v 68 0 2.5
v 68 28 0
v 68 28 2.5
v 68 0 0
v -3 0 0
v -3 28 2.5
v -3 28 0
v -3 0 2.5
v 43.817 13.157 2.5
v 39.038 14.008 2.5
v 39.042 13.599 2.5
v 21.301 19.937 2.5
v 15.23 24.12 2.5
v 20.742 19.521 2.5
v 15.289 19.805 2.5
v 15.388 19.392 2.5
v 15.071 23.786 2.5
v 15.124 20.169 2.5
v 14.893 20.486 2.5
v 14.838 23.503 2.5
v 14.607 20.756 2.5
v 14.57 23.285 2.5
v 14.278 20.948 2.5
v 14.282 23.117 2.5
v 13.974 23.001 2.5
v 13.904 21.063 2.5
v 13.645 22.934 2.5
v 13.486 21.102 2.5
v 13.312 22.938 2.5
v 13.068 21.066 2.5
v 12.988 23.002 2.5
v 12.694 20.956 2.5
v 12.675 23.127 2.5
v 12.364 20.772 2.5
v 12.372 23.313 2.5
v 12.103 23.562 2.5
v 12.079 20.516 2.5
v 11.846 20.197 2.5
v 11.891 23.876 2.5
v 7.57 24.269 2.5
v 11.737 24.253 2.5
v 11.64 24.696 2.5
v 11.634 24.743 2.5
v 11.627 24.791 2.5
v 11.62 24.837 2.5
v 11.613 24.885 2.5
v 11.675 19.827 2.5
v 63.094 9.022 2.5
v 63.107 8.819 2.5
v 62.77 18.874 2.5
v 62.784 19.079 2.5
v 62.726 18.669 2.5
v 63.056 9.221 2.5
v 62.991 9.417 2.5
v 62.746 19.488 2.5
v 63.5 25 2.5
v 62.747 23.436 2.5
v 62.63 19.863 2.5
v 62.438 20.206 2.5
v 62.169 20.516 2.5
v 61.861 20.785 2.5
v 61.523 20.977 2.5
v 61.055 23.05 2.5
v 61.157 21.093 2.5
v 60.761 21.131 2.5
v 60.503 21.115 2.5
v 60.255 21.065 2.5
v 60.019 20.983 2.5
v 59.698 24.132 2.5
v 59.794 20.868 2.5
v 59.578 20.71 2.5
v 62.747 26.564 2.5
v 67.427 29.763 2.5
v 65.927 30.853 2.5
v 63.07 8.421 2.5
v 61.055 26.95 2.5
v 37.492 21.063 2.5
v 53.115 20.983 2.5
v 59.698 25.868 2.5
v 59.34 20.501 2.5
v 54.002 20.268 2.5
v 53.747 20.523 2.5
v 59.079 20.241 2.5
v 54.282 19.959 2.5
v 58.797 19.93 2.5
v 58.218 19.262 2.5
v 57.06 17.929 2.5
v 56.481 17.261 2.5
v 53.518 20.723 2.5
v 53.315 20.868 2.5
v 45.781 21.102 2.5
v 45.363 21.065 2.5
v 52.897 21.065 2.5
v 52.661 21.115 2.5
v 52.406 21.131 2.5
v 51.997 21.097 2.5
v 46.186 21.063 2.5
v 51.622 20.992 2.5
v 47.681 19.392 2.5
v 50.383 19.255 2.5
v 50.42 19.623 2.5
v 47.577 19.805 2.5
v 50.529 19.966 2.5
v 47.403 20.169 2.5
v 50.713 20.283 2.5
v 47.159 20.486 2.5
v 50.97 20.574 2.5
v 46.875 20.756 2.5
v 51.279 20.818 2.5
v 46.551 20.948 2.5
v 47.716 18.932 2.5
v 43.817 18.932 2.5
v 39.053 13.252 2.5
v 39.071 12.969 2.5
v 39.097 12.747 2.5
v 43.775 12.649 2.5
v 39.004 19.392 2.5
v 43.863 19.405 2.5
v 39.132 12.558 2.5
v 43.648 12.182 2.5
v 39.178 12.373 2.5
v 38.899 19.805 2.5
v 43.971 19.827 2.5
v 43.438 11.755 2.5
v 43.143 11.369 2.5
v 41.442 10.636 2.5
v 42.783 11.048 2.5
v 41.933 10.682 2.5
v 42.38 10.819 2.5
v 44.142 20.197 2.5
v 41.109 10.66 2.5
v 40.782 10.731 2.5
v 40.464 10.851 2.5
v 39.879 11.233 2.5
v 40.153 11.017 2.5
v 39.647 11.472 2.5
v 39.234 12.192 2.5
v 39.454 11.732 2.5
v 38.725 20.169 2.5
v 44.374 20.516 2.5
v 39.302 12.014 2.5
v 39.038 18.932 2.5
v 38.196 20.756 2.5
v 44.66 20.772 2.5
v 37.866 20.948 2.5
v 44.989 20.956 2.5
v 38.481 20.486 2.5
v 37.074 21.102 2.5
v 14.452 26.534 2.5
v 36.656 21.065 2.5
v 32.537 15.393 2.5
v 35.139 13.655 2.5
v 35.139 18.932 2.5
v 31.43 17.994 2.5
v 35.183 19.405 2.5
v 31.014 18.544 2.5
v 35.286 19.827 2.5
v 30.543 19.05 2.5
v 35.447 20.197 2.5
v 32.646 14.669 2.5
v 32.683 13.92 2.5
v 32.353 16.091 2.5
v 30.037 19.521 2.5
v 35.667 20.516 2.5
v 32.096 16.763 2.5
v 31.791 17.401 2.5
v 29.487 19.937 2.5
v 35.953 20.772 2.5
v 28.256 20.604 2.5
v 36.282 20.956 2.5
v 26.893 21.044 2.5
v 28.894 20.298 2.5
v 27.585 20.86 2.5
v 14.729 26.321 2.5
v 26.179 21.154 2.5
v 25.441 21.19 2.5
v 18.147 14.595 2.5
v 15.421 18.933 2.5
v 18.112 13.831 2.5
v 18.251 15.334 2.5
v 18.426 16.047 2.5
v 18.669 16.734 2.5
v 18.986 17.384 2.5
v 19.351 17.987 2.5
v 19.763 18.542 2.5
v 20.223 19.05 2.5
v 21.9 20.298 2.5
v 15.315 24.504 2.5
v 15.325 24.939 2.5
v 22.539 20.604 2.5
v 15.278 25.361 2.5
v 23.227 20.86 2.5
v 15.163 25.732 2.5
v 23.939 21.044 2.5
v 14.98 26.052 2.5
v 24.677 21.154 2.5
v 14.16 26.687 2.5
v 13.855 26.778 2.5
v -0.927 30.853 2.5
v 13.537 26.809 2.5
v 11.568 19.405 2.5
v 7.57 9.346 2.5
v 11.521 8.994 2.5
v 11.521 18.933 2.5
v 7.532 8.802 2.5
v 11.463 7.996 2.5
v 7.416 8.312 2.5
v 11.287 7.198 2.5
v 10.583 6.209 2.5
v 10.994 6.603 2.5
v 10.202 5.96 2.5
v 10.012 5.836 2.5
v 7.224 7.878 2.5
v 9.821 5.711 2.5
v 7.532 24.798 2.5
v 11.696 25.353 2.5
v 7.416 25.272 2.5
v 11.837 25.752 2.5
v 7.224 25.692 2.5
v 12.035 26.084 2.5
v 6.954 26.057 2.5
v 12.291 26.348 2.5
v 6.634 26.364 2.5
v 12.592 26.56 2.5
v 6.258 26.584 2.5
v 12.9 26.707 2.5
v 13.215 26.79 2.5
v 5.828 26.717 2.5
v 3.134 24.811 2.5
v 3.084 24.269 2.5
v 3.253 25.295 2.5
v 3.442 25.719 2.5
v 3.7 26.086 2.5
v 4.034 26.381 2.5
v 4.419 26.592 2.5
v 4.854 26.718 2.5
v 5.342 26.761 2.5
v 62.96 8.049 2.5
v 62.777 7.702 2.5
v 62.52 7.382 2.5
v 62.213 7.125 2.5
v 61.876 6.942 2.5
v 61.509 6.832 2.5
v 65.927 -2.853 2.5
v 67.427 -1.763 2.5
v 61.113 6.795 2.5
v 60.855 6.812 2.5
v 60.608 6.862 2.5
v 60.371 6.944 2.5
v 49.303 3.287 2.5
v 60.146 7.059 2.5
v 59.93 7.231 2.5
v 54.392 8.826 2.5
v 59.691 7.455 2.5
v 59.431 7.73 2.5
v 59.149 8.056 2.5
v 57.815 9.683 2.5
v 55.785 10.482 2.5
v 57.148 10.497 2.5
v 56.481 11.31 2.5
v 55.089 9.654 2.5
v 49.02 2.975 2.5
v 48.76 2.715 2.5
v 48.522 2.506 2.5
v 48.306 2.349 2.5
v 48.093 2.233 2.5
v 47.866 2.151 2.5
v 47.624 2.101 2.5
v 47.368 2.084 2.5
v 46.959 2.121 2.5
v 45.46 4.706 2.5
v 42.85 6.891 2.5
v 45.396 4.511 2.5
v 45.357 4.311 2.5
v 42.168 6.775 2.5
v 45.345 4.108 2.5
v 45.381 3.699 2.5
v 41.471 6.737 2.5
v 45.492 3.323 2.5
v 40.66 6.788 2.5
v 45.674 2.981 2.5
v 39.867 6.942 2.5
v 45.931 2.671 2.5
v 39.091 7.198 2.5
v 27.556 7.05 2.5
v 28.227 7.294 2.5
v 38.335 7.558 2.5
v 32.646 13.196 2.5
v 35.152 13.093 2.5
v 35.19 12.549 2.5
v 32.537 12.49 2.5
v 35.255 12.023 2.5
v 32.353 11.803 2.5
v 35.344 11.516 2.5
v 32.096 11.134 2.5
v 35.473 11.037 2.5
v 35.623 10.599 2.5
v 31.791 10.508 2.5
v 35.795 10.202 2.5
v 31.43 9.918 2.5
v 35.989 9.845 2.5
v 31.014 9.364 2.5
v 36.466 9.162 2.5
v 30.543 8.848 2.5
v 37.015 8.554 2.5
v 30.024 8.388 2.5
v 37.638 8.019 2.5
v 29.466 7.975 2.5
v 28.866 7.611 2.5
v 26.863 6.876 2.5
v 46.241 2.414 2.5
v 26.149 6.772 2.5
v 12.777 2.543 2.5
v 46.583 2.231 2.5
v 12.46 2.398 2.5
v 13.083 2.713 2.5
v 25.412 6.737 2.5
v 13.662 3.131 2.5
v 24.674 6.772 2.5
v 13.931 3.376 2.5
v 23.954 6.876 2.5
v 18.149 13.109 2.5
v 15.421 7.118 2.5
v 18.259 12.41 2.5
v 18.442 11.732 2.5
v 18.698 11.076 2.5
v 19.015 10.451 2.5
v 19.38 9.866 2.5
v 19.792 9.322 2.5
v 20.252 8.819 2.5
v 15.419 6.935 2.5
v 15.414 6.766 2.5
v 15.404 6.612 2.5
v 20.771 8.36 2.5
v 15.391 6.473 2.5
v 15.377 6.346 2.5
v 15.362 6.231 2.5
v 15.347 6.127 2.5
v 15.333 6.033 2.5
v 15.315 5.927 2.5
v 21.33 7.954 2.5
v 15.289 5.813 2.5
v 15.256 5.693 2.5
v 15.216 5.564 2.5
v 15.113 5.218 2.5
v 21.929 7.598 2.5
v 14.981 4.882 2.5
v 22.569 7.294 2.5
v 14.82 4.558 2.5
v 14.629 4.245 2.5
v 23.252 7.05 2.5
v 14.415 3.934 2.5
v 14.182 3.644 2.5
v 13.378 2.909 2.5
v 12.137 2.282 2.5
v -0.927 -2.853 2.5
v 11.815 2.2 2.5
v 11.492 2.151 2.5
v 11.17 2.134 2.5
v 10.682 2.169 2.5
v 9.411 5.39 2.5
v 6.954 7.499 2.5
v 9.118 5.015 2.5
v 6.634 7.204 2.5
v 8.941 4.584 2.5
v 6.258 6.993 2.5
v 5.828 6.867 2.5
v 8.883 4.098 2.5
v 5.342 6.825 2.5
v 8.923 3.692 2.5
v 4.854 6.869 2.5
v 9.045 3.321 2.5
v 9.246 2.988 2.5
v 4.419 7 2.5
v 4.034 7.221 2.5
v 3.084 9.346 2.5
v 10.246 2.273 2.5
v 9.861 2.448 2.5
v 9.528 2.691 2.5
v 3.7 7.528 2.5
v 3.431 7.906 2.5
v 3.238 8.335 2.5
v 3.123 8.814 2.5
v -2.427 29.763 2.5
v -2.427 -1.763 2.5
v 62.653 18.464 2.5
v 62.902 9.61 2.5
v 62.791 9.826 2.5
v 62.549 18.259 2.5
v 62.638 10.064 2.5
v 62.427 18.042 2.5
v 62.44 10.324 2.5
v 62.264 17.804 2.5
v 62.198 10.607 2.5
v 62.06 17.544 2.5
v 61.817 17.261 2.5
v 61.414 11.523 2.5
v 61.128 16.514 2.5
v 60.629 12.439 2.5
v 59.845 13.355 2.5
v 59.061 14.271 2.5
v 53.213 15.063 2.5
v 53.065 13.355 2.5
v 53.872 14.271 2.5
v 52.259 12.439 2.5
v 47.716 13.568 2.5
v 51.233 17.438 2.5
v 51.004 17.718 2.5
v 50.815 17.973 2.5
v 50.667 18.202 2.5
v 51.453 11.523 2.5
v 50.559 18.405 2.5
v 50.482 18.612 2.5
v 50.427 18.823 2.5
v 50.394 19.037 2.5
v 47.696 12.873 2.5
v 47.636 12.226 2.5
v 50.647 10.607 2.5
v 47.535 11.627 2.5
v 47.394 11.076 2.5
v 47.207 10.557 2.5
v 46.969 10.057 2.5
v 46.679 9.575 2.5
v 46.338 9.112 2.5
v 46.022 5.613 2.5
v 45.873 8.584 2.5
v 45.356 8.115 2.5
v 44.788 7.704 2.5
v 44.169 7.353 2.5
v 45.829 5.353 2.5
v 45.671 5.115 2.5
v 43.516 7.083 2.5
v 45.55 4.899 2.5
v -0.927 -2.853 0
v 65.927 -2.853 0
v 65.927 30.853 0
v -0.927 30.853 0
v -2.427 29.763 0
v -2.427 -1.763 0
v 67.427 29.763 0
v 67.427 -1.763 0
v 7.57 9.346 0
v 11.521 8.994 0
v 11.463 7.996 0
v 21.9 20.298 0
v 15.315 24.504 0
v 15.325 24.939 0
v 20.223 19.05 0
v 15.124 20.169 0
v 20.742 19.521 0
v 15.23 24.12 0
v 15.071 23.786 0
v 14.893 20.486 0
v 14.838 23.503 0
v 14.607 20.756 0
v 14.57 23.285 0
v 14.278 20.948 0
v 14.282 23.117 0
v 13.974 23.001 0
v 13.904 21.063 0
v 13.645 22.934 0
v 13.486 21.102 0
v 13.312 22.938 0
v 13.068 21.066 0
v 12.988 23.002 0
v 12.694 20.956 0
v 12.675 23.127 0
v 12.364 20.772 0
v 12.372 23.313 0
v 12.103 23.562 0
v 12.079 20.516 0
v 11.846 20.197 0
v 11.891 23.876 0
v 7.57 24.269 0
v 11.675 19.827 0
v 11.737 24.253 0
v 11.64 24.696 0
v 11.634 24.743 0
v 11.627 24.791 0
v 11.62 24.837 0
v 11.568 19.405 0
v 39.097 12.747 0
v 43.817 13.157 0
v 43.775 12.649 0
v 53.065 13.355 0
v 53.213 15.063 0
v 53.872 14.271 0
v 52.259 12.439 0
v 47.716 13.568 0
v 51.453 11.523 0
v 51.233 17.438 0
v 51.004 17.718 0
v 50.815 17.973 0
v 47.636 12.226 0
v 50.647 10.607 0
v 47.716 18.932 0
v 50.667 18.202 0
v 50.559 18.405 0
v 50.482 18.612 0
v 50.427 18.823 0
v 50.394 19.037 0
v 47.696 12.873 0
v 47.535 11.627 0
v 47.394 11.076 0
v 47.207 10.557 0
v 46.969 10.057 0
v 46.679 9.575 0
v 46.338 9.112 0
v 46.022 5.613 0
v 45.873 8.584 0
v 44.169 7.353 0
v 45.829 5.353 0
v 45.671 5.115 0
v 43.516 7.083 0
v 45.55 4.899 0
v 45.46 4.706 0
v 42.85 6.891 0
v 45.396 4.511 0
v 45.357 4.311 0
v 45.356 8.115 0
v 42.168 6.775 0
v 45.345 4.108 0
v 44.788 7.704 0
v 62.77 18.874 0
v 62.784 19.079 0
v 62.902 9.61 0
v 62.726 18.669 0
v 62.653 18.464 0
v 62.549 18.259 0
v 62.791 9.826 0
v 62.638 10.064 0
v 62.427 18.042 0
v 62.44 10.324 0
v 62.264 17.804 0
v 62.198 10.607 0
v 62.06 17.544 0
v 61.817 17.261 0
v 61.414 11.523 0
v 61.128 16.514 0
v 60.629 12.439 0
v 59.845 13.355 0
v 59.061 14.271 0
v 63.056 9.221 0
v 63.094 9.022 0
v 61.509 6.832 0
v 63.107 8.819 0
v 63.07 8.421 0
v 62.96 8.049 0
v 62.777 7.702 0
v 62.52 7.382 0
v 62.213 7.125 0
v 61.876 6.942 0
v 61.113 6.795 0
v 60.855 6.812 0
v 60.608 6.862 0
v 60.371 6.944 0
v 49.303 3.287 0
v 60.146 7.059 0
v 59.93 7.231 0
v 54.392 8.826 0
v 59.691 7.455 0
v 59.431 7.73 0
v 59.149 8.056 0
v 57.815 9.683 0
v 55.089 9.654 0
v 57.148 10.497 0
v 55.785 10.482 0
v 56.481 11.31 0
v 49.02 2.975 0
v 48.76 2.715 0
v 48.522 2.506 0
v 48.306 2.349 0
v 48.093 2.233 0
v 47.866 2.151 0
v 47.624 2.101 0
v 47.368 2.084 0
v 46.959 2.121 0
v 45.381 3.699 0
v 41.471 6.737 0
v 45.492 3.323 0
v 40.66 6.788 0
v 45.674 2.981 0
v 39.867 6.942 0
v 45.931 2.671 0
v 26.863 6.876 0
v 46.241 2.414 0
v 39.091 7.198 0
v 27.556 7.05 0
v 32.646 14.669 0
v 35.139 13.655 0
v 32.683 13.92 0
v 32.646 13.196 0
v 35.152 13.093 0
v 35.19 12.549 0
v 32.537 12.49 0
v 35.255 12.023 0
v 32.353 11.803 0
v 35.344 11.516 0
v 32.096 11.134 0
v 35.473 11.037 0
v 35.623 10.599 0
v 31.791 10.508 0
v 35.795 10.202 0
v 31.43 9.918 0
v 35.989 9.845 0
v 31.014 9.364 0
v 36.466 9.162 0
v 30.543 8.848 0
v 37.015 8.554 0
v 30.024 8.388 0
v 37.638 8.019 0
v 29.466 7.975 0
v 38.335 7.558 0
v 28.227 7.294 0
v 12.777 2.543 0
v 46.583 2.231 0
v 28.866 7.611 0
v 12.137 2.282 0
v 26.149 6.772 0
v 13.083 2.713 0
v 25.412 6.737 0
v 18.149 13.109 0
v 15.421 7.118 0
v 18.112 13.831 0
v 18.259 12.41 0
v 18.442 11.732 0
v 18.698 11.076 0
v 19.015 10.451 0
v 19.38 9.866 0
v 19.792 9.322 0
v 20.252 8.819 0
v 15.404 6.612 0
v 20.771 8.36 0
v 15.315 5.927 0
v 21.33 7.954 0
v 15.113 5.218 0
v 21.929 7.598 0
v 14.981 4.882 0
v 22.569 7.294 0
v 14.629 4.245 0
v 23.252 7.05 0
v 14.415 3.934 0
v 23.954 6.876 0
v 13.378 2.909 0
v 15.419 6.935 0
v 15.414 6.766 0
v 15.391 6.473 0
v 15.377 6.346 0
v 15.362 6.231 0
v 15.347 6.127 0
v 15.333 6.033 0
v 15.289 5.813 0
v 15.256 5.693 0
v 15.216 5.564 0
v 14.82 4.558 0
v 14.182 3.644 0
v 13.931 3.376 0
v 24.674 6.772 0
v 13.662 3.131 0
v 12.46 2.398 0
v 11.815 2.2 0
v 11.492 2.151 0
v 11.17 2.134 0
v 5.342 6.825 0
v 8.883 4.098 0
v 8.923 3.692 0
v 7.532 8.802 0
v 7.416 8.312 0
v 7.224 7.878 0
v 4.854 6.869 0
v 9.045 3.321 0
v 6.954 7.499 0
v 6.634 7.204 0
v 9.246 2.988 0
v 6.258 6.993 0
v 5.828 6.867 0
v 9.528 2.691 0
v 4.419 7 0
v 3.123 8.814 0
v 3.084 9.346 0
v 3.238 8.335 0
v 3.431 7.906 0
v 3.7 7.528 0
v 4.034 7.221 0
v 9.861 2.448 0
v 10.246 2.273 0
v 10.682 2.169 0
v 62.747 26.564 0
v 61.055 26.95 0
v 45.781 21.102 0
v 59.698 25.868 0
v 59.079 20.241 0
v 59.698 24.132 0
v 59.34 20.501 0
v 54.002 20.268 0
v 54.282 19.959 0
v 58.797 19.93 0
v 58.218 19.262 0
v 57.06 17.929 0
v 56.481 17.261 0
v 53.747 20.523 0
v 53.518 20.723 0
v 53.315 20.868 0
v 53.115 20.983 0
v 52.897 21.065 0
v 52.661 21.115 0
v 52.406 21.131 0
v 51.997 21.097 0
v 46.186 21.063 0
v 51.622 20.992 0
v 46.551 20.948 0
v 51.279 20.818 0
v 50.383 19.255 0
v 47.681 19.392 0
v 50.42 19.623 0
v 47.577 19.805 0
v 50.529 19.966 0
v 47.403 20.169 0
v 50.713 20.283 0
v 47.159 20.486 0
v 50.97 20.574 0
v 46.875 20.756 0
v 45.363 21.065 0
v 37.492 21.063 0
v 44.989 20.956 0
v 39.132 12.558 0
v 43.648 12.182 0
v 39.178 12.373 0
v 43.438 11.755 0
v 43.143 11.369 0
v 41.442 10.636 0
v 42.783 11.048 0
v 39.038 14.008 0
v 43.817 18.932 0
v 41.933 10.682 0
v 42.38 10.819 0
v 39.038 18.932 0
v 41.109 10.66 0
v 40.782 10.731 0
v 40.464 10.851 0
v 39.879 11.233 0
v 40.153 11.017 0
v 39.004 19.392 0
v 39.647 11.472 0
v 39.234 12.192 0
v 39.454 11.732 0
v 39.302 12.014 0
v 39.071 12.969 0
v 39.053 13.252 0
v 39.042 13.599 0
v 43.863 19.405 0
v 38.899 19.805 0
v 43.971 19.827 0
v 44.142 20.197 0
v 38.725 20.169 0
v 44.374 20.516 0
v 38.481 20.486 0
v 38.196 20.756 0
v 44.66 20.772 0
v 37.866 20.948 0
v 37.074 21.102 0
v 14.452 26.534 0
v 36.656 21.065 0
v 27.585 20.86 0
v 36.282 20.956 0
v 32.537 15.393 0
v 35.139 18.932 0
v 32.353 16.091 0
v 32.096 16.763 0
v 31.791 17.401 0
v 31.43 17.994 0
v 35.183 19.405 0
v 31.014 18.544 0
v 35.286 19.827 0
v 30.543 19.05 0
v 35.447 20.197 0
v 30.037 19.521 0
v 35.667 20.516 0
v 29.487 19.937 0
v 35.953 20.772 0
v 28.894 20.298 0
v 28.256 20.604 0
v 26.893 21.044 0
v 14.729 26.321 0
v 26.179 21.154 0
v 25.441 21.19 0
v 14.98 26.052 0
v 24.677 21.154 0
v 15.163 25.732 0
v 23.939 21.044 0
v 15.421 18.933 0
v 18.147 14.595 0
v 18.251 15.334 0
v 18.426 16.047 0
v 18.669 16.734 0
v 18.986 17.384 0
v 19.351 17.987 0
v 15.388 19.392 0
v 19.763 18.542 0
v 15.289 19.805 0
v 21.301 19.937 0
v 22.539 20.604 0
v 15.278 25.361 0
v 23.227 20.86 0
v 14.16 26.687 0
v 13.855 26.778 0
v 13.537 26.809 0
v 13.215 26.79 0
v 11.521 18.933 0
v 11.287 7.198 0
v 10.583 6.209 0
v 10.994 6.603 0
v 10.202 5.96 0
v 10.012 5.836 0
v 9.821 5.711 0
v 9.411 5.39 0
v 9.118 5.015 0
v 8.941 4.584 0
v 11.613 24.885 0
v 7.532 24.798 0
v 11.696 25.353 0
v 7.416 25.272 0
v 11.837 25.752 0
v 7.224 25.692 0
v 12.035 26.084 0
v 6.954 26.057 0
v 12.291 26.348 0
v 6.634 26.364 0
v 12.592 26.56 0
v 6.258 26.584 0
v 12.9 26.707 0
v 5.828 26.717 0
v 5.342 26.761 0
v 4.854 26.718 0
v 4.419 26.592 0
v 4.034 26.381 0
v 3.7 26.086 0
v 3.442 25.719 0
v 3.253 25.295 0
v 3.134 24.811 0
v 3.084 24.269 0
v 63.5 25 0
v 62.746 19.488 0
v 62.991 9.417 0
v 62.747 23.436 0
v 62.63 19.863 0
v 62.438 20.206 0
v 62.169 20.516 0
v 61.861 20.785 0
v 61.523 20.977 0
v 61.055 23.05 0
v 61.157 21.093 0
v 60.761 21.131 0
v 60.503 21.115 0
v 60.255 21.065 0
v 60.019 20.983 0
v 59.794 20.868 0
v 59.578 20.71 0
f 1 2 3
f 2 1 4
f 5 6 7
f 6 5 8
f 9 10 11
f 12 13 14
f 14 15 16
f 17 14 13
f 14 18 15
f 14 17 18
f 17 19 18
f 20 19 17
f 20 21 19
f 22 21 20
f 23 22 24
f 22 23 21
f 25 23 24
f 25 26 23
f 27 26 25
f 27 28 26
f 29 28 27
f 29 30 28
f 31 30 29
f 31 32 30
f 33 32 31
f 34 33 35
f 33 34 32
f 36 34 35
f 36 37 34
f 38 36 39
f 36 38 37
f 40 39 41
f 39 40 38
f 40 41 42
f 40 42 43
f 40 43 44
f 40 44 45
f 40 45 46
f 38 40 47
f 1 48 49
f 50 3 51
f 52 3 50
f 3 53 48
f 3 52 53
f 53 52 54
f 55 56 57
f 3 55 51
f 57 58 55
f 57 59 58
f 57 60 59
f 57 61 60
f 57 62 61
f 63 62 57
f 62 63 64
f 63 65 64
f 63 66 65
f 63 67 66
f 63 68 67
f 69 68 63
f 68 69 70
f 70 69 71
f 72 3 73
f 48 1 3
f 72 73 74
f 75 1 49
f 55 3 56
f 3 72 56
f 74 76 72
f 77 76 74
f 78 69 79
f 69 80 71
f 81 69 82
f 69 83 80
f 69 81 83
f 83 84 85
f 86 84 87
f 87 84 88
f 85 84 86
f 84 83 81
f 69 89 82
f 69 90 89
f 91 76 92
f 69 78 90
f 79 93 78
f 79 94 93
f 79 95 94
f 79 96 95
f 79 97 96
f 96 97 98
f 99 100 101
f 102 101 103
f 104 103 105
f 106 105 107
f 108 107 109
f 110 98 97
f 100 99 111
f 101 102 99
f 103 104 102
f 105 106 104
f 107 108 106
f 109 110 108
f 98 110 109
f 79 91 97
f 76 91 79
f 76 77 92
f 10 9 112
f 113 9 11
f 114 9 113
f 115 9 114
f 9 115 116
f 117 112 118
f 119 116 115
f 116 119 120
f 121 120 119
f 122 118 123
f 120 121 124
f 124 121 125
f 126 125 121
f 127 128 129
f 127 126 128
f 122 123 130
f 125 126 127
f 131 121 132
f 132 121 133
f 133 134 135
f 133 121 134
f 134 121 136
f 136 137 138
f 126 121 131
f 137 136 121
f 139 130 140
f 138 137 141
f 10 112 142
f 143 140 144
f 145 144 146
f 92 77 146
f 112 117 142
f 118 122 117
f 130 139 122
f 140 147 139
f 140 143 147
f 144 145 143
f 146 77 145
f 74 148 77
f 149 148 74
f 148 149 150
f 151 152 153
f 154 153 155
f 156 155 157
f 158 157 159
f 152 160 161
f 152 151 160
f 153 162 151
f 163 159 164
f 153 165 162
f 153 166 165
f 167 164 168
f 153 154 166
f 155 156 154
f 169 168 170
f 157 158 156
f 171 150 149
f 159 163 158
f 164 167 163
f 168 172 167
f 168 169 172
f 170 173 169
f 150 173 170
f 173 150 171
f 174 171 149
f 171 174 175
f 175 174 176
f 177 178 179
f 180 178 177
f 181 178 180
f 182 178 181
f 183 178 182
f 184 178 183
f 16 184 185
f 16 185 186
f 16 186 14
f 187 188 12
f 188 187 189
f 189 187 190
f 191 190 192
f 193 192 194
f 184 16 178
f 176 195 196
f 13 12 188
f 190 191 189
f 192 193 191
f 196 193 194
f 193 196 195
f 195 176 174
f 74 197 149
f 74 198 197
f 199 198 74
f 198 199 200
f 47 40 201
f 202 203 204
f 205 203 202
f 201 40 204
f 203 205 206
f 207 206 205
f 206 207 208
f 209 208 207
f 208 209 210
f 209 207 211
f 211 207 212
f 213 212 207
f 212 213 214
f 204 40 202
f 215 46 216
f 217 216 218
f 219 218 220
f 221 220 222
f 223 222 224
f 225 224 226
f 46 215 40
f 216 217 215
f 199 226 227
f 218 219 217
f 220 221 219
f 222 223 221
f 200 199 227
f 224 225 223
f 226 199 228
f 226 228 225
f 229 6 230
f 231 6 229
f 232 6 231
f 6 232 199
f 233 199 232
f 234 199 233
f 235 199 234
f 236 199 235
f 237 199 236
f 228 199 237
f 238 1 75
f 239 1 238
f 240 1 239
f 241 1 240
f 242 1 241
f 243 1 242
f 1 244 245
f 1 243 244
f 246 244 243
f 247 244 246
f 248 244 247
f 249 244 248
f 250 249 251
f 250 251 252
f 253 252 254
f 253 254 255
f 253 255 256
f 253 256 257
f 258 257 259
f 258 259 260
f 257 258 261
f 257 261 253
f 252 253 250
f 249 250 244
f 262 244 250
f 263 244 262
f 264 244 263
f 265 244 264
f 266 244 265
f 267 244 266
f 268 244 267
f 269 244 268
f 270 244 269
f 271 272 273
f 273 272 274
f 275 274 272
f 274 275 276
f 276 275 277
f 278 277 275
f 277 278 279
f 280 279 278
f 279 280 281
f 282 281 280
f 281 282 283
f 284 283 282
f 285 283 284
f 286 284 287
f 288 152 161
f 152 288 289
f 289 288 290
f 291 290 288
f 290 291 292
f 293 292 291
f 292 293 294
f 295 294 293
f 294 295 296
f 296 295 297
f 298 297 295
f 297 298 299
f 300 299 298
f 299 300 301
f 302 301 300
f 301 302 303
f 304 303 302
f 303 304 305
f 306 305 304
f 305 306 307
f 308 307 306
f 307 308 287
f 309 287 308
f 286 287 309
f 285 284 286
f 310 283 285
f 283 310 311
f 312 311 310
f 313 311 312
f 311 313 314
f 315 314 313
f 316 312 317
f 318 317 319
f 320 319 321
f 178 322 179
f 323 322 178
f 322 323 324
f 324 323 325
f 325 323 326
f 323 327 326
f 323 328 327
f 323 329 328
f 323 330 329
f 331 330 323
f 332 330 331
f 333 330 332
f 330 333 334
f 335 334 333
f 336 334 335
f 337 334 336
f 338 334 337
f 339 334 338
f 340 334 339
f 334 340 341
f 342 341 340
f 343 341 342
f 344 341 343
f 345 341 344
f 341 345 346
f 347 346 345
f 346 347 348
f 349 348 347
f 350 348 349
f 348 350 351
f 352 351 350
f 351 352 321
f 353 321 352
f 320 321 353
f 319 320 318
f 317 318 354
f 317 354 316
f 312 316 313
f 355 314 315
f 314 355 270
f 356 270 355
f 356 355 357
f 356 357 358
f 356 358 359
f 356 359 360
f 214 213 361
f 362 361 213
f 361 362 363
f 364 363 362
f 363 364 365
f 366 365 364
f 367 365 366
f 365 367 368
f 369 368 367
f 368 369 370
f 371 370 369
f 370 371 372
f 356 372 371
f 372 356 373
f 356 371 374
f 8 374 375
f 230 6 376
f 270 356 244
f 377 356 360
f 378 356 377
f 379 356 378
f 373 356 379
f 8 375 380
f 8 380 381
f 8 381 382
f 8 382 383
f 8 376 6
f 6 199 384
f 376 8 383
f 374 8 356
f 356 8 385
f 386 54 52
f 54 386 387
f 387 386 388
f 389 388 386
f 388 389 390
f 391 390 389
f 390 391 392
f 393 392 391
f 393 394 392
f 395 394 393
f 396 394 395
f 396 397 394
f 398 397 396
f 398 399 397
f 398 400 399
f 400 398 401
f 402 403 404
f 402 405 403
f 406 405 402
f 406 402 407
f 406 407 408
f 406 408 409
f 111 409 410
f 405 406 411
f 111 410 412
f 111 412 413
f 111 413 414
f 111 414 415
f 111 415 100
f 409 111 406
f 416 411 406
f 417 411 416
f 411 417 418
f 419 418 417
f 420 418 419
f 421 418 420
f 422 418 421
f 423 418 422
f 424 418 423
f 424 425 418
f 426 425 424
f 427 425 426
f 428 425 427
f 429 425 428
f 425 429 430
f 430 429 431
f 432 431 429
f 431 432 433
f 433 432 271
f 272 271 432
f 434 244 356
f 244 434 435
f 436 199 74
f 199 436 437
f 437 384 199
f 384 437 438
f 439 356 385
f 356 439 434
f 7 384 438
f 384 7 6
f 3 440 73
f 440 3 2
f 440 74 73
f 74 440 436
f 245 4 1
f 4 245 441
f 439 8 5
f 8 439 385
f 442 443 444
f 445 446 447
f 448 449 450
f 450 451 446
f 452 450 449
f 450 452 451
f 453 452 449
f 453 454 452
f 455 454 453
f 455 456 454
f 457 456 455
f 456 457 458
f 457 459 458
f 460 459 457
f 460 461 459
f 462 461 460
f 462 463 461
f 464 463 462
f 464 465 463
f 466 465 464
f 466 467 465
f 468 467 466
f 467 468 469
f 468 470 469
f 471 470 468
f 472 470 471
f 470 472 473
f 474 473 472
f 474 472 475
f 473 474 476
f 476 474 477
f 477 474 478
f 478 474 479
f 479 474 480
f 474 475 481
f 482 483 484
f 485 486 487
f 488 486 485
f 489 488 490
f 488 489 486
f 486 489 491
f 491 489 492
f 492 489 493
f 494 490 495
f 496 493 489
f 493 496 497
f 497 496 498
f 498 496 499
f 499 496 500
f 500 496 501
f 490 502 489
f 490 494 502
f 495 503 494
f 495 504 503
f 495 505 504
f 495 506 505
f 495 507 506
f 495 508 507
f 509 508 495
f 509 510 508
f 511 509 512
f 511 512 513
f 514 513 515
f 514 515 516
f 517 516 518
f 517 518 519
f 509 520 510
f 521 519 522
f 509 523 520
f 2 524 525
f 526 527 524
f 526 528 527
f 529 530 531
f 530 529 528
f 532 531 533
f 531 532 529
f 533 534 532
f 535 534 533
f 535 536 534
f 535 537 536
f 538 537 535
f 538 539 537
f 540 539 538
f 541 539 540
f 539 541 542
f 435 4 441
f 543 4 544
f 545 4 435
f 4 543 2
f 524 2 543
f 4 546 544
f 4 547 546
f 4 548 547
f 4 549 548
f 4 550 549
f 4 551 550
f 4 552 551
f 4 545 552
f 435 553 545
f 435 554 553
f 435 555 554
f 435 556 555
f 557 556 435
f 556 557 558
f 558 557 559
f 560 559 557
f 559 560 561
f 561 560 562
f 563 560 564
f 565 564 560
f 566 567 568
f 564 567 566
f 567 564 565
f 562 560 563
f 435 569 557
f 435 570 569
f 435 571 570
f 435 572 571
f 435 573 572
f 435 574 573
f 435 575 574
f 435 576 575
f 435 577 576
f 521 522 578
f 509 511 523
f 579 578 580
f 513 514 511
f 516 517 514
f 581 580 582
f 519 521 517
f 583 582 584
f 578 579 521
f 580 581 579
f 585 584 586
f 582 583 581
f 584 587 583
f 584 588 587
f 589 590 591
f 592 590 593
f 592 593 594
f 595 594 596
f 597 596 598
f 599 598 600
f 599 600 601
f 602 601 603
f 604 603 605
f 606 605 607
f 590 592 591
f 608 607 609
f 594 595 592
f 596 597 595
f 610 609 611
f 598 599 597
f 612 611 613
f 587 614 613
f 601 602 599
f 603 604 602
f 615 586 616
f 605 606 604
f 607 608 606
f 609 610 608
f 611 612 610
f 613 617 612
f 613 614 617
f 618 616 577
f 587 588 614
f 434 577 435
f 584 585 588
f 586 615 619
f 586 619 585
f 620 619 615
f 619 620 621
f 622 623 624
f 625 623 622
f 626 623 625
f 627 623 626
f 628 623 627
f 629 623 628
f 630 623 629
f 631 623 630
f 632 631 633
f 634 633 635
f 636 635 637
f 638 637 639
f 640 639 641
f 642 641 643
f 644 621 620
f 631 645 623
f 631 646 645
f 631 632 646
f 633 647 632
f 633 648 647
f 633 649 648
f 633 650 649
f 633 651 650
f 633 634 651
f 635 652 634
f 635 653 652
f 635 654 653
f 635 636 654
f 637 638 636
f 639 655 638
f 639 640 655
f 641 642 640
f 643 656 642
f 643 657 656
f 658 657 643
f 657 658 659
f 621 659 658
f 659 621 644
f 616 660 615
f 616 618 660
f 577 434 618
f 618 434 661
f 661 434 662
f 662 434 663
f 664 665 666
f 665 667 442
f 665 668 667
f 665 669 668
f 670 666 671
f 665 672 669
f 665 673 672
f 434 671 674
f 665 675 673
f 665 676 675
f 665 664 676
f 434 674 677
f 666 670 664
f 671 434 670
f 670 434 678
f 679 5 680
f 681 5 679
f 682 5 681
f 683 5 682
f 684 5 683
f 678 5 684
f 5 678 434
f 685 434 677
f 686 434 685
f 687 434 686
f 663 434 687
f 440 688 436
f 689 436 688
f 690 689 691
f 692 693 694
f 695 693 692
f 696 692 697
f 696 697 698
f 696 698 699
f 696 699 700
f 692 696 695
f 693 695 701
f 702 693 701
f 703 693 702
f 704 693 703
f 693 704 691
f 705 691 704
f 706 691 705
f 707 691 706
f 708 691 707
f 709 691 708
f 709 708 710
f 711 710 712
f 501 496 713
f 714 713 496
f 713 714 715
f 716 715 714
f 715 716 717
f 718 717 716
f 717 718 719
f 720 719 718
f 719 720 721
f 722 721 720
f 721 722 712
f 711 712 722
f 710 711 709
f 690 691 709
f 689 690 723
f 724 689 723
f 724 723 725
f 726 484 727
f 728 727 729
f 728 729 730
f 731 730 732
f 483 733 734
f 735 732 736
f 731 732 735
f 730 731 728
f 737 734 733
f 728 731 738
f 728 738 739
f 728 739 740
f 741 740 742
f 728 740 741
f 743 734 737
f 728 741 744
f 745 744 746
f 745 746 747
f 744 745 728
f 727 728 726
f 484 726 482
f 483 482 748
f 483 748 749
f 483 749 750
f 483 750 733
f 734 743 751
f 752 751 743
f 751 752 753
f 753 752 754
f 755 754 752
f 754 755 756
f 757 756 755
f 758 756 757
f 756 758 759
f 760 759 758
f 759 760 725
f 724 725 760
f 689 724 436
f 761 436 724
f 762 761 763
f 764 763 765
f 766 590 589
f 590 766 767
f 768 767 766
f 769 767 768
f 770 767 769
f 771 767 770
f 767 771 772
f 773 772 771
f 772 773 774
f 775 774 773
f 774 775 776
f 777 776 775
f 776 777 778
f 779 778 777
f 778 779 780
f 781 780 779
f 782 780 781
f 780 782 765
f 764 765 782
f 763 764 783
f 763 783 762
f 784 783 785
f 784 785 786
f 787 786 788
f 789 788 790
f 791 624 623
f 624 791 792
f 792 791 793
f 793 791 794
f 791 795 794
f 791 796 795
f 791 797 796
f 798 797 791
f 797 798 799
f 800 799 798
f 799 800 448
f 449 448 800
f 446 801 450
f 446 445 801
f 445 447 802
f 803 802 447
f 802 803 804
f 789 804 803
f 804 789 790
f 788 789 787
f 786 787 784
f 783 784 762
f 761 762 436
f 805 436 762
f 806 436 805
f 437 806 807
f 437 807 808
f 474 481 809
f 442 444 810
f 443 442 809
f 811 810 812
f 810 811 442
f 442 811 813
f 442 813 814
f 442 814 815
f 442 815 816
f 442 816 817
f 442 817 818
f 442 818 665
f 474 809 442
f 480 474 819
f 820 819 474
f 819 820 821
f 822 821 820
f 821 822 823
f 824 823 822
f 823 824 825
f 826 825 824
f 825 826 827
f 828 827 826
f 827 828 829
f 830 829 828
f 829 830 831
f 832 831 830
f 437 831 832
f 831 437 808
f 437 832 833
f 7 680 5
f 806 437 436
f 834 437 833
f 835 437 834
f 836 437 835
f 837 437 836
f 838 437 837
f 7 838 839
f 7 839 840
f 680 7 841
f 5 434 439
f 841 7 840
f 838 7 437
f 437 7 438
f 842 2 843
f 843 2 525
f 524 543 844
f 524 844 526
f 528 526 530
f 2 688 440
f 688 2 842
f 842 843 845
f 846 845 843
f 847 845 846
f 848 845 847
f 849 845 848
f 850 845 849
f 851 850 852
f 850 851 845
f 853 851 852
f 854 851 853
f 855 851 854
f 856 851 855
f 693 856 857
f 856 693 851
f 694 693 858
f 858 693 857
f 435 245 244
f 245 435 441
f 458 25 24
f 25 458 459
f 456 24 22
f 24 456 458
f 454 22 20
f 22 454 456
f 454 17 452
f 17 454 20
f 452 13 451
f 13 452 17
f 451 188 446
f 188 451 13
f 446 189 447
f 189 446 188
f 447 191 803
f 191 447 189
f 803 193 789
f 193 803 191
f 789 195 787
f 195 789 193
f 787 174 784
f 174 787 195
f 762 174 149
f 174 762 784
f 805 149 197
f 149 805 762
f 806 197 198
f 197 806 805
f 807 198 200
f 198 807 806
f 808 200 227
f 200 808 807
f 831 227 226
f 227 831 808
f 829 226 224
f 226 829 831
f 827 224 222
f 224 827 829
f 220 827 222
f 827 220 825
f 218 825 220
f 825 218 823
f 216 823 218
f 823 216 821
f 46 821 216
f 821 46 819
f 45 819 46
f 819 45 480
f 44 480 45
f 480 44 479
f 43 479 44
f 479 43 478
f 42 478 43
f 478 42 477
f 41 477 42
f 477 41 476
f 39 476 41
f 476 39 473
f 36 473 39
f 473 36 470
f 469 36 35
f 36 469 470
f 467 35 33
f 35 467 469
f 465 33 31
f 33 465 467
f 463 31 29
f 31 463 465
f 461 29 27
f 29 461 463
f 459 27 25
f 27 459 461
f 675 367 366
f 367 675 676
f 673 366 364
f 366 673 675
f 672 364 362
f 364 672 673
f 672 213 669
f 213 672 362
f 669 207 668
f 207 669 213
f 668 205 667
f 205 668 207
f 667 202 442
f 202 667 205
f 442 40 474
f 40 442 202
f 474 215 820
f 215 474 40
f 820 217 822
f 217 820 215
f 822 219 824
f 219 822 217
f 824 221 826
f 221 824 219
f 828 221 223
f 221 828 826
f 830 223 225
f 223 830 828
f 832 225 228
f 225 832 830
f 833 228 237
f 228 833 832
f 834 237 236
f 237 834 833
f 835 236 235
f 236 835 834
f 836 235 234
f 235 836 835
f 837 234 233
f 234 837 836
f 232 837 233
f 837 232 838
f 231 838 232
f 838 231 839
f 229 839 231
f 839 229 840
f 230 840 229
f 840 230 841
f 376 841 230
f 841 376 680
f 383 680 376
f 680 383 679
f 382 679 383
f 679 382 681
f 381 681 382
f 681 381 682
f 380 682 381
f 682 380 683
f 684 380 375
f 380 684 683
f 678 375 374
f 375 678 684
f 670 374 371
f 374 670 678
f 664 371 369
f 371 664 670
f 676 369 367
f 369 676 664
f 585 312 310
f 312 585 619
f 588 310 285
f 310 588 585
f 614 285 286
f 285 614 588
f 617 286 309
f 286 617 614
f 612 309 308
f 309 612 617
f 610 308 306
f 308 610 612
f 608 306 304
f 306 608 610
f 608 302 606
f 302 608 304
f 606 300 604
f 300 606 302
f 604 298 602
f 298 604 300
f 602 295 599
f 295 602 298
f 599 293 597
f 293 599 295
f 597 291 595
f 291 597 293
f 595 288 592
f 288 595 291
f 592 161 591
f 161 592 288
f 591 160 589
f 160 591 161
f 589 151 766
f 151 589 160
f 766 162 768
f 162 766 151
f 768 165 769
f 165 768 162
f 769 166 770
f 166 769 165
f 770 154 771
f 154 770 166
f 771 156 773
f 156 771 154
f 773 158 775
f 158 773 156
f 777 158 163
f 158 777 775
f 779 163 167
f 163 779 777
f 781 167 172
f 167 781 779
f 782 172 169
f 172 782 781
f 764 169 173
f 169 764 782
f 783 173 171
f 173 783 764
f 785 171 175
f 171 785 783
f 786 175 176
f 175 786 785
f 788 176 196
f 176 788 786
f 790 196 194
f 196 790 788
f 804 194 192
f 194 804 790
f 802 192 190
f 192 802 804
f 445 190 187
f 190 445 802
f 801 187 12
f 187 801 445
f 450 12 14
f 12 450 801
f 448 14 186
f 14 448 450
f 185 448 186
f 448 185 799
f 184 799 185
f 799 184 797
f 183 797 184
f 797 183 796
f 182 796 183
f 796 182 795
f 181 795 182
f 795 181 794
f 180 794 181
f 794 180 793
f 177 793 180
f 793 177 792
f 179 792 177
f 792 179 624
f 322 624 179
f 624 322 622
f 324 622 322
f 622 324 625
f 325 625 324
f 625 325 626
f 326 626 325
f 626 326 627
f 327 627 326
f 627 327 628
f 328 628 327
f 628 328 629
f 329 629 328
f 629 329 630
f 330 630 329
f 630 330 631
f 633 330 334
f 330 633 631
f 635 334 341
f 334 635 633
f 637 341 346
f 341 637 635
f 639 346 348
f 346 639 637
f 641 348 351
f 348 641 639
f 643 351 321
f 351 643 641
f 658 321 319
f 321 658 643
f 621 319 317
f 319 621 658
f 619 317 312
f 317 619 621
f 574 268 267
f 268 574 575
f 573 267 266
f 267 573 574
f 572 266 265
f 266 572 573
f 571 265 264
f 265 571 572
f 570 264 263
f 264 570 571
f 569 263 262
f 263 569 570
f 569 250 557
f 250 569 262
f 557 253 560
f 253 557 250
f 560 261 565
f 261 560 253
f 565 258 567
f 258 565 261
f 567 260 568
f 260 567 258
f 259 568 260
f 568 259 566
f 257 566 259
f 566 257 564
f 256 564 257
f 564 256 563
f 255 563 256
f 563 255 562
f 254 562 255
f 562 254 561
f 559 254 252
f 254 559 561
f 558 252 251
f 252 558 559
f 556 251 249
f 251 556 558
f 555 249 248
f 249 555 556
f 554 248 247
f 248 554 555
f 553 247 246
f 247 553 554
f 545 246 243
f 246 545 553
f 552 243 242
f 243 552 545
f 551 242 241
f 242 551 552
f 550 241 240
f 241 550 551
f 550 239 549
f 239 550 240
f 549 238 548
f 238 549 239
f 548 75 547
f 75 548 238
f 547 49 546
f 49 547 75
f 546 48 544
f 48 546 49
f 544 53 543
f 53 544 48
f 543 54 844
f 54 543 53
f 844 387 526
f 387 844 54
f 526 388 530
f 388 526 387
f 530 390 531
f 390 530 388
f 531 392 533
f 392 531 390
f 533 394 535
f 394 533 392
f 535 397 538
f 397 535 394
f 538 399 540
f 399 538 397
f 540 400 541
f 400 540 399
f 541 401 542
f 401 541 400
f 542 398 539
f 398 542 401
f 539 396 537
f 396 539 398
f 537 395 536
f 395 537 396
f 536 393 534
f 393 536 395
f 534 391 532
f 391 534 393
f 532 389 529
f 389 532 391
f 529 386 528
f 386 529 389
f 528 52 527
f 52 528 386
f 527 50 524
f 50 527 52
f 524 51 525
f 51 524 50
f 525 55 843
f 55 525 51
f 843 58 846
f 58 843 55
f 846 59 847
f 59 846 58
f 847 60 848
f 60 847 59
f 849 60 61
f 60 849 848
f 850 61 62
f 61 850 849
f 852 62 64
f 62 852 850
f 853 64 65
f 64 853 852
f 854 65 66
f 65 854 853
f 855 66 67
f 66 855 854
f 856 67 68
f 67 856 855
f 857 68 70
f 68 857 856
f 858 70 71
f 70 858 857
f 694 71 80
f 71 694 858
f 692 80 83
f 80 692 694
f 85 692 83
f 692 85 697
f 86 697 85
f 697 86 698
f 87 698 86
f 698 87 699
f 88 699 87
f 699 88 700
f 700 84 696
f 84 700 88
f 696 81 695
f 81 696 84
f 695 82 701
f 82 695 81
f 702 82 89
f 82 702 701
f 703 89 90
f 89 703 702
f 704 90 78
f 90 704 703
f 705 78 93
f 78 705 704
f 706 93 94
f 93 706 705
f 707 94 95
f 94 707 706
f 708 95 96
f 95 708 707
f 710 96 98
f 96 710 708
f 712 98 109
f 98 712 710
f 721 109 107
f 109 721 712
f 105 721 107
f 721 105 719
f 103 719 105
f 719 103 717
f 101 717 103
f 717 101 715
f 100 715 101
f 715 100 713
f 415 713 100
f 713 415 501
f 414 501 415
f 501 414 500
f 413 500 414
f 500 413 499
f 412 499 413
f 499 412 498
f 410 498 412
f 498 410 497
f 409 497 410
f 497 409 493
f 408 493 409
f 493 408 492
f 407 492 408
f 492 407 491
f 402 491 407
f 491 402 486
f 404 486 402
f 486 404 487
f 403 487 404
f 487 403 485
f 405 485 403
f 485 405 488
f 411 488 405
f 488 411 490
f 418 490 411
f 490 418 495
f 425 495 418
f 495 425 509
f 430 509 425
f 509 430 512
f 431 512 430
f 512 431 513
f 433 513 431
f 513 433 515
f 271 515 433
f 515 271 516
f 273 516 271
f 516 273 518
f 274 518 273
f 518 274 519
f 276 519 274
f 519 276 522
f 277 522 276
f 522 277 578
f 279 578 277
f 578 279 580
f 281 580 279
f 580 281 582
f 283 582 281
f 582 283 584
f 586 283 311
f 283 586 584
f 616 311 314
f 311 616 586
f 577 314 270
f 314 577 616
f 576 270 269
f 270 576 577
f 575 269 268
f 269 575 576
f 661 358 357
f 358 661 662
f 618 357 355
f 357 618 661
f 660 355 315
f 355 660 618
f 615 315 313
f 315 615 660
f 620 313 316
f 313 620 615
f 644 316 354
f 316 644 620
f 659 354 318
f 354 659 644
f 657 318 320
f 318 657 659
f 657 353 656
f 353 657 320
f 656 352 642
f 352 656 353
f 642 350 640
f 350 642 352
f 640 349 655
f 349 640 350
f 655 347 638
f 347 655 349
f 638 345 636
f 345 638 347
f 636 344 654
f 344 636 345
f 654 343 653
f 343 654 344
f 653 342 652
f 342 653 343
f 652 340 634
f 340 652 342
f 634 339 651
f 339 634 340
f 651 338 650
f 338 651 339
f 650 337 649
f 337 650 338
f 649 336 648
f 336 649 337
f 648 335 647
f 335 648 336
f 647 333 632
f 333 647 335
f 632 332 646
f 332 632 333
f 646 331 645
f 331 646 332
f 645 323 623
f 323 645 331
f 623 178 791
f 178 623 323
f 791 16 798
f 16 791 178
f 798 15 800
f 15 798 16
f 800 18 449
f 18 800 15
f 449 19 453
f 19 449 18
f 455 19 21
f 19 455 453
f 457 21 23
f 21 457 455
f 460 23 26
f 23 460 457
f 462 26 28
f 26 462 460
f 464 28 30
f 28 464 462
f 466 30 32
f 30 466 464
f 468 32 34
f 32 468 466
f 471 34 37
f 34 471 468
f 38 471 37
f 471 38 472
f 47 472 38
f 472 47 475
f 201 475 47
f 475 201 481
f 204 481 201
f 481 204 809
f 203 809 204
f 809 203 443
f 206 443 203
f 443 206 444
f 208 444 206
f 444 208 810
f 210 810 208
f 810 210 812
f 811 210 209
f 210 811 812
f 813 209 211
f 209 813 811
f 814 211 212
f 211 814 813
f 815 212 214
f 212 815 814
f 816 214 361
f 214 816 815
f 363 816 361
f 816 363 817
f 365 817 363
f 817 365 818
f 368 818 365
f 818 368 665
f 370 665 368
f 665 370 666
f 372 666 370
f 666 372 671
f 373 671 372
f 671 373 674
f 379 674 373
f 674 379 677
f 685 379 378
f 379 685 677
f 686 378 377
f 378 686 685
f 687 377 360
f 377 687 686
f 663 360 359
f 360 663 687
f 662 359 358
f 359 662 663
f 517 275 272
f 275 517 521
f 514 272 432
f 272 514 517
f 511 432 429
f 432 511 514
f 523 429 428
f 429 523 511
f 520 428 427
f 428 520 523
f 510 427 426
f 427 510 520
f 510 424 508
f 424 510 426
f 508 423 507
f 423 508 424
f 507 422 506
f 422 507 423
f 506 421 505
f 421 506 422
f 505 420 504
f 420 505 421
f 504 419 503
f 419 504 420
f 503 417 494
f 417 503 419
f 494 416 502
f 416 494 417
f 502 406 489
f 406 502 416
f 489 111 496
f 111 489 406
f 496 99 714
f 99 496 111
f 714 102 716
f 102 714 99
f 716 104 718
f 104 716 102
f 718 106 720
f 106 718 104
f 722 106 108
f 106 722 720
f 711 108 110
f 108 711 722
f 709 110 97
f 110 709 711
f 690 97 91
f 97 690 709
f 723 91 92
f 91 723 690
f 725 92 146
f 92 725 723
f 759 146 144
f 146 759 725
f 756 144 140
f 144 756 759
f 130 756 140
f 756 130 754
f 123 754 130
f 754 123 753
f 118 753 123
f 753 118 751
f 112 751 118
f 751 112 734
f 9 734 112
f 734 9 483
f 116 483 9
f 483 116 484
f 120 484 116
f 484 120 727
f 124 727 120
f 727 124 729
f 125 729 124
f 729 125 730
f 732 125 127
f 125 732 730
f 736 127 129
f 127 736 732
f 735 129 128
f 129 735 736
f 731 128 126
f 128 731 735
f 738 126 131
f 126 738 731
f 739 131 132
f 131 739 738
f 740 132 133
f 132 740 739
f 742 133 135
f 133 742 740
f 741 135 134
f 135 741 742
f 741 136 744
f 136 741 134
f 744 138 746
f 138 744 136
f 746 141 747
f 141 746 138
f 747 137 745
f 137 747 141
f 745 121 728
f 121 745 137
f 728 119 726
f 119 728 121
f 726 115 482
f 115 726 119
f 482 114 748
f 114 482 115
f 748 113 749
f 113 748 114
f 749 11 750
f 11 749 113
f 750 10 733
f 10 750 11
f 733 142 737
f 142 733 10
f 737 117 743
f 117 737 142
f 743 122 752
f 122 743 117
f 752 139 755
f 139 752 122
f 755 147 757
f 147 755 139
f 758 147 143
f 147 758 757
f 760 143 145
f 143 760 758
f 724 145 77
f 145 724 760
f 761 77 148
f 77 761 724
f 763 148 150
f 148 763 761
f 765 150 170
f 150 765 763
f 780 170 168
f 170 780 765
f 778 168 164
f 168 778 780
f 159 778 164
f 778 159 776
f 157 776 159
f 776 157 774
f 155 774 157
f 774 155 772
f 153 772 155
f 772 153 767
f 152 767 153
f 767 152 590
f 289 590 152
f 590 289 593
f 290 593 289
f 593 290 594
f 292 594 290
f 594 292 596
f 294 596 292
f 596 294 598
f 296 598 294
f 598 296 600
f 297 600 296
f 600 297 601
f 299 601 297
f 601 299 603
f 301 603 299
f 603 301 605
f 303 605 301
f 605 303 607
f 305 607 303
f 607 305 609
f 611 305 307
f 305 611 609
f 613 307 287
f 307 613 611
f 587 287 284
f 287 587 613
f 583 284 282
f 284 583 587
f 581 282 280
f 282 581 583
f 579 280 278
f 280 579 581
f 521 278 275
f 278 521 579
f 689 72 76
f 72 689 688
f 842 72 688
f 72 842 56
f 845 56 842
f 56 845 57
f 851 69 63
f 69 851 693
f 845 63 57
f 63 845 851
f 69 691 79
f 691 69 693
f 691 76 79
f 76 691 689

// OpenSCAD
difference() {
	minkowski() {
 		cube([65,28,1.5]);
	    cylinder(r=3,h=1);
	}
	translate([3,2,0])
	scale([0.6, 0.6, 1])
	  linear_extrude(height=2.5)
	    import("ijoux.dxf");
	translate([61.5, 25, 0])
		cylinder(h=2.5, r=2);
}
